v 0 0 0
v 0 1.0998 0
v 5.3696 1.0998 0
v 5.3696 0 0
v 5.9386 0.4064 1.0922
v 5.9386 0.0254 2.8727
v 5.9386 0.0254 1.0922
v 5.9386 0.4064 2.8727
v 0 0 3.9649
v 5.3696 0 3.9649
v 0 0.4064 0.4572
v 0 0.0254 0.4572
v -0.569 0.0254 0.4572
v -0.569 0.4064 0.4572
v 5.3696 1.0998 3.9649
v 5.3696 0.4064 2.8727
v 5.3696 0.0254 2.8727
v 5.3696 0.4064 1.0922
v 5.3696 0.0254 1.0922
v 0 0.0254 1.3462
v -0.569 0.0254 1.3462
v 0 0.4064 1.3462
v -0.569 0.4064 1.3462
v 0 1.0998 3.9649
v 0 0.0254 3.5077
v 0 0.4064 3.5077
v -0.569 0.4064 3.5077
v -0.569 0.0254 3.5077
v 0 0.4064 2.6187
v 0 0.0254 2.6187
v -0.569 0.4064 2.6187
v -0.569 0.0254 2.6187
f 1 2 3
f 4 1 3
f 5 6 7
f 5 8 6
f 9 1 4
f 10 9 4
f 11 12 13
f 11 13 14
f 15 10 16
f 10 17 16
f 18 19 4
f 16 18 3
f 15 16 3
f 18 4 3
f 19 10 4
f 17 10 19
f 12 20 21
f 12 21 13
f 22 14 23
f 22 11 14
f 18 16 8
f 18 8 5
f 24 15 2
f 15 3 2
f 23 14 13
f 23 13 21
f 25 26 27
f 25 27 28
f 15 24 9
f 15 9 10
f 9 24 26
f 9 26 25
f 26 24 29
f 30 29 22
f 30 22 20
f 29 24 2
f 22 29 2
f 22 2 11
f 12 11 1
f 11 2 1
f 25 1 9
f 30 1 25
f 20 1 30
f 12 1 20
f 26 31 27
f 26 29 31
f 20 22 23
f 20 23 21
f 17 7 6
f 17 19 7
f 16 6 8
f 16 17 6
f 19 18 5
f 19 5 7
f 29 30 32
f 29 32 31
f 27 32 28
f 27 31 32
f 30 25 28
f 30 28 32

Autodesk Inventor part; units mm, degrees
ref_plane "YZ Plane" through (0, 0, 0) normal (1, 0, 0) x (0, 1, 0)
ref_plane "XZ Plane" through (0, 0, 0) normal (0, 1, 0) x (-1, 0, 0)
ref_plane "XY Plane" through (0, 0, 0) normal (0, 0, 1) x (1, 0, 0)
sketch "Sketch1" plane through (0, 0, 0) normal (0, 0, 1) x (1, 0, 0)
  line L0 (0, 0) -> (5.3696, 0)
  line L1 (5.3696, 0) -> (5.3696, 1.0998)
  line L2 (5.3696, 1.0998) -> (0, 1.0998)
  line L3 (0, 1.0998) -> (0, 0)
  dimension "d0" = 1.0998
  dimension "d1" = 5.3696
extrude "Extrusion1" add sketch "Sketch1" along normal blind 3.9649
sketch "Sketch2" plane through (5.3696, 0, 0) normal (1, 0, 0) x (0, 0, -1)
  line L0 (-2.8727, 0.4064) -> (-1.0922, 0.4064)
  line L1 (-1.0922, 0.4064) -> (-1.0922, 0.0254)
  line L2 (-1.0922, 0.0254) -> (-2.8727, 0.0254)
  line L3 (-2.8727, 0.0254) -> (-2.8727, 0.4064)
  line L4 (-3.9649, 0) -> (-3.9649, 1.0998) projected
  line L5 (0, 0) -> (-3.9649, 0) projected
  dimension "d4" = 1.7805
  dimension "d5" = 0.381
  dimension "d6" = 1.0922
  dimension "d7" = 0.0254
extrude "Extrusion2" add sketch "Sketch2" along normal blind 0.569
sketch "Sketch3" plane through (0, 0, 0) normal (-1, 0, 0) x (0, 0, 1)
  line L0 (0.4572, 0.4064) -> (1.3462, 0.4064)
  line L1 (1.3462, 0.4064) -> (1.3462, 0.0254)
  line L2 (1.3462, 0.0254) -> (0.4572, 0.0254)
  line L3 (0.4572, 0.0254) -> (0.4572, 0.4064)
  line L4 (2.6187, 0.4064) -> (3.5077, 0.4064)
  line L5 (3.5077, 0.4064) -> (3.5077, 0.0254)
  line L6 (3.5077, 0.0254) -> (2.6187, 0.0254)
  line L7 (2.6187, 0.0254) -> (2.6187, 0.4064)
  line L8 (0, 0) -> (3.9649, 0) projected
  line L9 (0, 1.0998) -> (0, 0) projected
  line L10 (3.9649, 1.0998) -> (3.9649, 0) projected
  dimension "d10" = 0.381
  dimension "d11" = 0.0254
  dimension "d12" = 0.889
  dimension "d13" = 0.889
  dimension "d14" = 0.4572
  dimension "d15" = 0.4572
extrude "Extrusion3" add sketch "Sketch3" along normal blind 0.569
properties part number "s20A 60V Diode"
